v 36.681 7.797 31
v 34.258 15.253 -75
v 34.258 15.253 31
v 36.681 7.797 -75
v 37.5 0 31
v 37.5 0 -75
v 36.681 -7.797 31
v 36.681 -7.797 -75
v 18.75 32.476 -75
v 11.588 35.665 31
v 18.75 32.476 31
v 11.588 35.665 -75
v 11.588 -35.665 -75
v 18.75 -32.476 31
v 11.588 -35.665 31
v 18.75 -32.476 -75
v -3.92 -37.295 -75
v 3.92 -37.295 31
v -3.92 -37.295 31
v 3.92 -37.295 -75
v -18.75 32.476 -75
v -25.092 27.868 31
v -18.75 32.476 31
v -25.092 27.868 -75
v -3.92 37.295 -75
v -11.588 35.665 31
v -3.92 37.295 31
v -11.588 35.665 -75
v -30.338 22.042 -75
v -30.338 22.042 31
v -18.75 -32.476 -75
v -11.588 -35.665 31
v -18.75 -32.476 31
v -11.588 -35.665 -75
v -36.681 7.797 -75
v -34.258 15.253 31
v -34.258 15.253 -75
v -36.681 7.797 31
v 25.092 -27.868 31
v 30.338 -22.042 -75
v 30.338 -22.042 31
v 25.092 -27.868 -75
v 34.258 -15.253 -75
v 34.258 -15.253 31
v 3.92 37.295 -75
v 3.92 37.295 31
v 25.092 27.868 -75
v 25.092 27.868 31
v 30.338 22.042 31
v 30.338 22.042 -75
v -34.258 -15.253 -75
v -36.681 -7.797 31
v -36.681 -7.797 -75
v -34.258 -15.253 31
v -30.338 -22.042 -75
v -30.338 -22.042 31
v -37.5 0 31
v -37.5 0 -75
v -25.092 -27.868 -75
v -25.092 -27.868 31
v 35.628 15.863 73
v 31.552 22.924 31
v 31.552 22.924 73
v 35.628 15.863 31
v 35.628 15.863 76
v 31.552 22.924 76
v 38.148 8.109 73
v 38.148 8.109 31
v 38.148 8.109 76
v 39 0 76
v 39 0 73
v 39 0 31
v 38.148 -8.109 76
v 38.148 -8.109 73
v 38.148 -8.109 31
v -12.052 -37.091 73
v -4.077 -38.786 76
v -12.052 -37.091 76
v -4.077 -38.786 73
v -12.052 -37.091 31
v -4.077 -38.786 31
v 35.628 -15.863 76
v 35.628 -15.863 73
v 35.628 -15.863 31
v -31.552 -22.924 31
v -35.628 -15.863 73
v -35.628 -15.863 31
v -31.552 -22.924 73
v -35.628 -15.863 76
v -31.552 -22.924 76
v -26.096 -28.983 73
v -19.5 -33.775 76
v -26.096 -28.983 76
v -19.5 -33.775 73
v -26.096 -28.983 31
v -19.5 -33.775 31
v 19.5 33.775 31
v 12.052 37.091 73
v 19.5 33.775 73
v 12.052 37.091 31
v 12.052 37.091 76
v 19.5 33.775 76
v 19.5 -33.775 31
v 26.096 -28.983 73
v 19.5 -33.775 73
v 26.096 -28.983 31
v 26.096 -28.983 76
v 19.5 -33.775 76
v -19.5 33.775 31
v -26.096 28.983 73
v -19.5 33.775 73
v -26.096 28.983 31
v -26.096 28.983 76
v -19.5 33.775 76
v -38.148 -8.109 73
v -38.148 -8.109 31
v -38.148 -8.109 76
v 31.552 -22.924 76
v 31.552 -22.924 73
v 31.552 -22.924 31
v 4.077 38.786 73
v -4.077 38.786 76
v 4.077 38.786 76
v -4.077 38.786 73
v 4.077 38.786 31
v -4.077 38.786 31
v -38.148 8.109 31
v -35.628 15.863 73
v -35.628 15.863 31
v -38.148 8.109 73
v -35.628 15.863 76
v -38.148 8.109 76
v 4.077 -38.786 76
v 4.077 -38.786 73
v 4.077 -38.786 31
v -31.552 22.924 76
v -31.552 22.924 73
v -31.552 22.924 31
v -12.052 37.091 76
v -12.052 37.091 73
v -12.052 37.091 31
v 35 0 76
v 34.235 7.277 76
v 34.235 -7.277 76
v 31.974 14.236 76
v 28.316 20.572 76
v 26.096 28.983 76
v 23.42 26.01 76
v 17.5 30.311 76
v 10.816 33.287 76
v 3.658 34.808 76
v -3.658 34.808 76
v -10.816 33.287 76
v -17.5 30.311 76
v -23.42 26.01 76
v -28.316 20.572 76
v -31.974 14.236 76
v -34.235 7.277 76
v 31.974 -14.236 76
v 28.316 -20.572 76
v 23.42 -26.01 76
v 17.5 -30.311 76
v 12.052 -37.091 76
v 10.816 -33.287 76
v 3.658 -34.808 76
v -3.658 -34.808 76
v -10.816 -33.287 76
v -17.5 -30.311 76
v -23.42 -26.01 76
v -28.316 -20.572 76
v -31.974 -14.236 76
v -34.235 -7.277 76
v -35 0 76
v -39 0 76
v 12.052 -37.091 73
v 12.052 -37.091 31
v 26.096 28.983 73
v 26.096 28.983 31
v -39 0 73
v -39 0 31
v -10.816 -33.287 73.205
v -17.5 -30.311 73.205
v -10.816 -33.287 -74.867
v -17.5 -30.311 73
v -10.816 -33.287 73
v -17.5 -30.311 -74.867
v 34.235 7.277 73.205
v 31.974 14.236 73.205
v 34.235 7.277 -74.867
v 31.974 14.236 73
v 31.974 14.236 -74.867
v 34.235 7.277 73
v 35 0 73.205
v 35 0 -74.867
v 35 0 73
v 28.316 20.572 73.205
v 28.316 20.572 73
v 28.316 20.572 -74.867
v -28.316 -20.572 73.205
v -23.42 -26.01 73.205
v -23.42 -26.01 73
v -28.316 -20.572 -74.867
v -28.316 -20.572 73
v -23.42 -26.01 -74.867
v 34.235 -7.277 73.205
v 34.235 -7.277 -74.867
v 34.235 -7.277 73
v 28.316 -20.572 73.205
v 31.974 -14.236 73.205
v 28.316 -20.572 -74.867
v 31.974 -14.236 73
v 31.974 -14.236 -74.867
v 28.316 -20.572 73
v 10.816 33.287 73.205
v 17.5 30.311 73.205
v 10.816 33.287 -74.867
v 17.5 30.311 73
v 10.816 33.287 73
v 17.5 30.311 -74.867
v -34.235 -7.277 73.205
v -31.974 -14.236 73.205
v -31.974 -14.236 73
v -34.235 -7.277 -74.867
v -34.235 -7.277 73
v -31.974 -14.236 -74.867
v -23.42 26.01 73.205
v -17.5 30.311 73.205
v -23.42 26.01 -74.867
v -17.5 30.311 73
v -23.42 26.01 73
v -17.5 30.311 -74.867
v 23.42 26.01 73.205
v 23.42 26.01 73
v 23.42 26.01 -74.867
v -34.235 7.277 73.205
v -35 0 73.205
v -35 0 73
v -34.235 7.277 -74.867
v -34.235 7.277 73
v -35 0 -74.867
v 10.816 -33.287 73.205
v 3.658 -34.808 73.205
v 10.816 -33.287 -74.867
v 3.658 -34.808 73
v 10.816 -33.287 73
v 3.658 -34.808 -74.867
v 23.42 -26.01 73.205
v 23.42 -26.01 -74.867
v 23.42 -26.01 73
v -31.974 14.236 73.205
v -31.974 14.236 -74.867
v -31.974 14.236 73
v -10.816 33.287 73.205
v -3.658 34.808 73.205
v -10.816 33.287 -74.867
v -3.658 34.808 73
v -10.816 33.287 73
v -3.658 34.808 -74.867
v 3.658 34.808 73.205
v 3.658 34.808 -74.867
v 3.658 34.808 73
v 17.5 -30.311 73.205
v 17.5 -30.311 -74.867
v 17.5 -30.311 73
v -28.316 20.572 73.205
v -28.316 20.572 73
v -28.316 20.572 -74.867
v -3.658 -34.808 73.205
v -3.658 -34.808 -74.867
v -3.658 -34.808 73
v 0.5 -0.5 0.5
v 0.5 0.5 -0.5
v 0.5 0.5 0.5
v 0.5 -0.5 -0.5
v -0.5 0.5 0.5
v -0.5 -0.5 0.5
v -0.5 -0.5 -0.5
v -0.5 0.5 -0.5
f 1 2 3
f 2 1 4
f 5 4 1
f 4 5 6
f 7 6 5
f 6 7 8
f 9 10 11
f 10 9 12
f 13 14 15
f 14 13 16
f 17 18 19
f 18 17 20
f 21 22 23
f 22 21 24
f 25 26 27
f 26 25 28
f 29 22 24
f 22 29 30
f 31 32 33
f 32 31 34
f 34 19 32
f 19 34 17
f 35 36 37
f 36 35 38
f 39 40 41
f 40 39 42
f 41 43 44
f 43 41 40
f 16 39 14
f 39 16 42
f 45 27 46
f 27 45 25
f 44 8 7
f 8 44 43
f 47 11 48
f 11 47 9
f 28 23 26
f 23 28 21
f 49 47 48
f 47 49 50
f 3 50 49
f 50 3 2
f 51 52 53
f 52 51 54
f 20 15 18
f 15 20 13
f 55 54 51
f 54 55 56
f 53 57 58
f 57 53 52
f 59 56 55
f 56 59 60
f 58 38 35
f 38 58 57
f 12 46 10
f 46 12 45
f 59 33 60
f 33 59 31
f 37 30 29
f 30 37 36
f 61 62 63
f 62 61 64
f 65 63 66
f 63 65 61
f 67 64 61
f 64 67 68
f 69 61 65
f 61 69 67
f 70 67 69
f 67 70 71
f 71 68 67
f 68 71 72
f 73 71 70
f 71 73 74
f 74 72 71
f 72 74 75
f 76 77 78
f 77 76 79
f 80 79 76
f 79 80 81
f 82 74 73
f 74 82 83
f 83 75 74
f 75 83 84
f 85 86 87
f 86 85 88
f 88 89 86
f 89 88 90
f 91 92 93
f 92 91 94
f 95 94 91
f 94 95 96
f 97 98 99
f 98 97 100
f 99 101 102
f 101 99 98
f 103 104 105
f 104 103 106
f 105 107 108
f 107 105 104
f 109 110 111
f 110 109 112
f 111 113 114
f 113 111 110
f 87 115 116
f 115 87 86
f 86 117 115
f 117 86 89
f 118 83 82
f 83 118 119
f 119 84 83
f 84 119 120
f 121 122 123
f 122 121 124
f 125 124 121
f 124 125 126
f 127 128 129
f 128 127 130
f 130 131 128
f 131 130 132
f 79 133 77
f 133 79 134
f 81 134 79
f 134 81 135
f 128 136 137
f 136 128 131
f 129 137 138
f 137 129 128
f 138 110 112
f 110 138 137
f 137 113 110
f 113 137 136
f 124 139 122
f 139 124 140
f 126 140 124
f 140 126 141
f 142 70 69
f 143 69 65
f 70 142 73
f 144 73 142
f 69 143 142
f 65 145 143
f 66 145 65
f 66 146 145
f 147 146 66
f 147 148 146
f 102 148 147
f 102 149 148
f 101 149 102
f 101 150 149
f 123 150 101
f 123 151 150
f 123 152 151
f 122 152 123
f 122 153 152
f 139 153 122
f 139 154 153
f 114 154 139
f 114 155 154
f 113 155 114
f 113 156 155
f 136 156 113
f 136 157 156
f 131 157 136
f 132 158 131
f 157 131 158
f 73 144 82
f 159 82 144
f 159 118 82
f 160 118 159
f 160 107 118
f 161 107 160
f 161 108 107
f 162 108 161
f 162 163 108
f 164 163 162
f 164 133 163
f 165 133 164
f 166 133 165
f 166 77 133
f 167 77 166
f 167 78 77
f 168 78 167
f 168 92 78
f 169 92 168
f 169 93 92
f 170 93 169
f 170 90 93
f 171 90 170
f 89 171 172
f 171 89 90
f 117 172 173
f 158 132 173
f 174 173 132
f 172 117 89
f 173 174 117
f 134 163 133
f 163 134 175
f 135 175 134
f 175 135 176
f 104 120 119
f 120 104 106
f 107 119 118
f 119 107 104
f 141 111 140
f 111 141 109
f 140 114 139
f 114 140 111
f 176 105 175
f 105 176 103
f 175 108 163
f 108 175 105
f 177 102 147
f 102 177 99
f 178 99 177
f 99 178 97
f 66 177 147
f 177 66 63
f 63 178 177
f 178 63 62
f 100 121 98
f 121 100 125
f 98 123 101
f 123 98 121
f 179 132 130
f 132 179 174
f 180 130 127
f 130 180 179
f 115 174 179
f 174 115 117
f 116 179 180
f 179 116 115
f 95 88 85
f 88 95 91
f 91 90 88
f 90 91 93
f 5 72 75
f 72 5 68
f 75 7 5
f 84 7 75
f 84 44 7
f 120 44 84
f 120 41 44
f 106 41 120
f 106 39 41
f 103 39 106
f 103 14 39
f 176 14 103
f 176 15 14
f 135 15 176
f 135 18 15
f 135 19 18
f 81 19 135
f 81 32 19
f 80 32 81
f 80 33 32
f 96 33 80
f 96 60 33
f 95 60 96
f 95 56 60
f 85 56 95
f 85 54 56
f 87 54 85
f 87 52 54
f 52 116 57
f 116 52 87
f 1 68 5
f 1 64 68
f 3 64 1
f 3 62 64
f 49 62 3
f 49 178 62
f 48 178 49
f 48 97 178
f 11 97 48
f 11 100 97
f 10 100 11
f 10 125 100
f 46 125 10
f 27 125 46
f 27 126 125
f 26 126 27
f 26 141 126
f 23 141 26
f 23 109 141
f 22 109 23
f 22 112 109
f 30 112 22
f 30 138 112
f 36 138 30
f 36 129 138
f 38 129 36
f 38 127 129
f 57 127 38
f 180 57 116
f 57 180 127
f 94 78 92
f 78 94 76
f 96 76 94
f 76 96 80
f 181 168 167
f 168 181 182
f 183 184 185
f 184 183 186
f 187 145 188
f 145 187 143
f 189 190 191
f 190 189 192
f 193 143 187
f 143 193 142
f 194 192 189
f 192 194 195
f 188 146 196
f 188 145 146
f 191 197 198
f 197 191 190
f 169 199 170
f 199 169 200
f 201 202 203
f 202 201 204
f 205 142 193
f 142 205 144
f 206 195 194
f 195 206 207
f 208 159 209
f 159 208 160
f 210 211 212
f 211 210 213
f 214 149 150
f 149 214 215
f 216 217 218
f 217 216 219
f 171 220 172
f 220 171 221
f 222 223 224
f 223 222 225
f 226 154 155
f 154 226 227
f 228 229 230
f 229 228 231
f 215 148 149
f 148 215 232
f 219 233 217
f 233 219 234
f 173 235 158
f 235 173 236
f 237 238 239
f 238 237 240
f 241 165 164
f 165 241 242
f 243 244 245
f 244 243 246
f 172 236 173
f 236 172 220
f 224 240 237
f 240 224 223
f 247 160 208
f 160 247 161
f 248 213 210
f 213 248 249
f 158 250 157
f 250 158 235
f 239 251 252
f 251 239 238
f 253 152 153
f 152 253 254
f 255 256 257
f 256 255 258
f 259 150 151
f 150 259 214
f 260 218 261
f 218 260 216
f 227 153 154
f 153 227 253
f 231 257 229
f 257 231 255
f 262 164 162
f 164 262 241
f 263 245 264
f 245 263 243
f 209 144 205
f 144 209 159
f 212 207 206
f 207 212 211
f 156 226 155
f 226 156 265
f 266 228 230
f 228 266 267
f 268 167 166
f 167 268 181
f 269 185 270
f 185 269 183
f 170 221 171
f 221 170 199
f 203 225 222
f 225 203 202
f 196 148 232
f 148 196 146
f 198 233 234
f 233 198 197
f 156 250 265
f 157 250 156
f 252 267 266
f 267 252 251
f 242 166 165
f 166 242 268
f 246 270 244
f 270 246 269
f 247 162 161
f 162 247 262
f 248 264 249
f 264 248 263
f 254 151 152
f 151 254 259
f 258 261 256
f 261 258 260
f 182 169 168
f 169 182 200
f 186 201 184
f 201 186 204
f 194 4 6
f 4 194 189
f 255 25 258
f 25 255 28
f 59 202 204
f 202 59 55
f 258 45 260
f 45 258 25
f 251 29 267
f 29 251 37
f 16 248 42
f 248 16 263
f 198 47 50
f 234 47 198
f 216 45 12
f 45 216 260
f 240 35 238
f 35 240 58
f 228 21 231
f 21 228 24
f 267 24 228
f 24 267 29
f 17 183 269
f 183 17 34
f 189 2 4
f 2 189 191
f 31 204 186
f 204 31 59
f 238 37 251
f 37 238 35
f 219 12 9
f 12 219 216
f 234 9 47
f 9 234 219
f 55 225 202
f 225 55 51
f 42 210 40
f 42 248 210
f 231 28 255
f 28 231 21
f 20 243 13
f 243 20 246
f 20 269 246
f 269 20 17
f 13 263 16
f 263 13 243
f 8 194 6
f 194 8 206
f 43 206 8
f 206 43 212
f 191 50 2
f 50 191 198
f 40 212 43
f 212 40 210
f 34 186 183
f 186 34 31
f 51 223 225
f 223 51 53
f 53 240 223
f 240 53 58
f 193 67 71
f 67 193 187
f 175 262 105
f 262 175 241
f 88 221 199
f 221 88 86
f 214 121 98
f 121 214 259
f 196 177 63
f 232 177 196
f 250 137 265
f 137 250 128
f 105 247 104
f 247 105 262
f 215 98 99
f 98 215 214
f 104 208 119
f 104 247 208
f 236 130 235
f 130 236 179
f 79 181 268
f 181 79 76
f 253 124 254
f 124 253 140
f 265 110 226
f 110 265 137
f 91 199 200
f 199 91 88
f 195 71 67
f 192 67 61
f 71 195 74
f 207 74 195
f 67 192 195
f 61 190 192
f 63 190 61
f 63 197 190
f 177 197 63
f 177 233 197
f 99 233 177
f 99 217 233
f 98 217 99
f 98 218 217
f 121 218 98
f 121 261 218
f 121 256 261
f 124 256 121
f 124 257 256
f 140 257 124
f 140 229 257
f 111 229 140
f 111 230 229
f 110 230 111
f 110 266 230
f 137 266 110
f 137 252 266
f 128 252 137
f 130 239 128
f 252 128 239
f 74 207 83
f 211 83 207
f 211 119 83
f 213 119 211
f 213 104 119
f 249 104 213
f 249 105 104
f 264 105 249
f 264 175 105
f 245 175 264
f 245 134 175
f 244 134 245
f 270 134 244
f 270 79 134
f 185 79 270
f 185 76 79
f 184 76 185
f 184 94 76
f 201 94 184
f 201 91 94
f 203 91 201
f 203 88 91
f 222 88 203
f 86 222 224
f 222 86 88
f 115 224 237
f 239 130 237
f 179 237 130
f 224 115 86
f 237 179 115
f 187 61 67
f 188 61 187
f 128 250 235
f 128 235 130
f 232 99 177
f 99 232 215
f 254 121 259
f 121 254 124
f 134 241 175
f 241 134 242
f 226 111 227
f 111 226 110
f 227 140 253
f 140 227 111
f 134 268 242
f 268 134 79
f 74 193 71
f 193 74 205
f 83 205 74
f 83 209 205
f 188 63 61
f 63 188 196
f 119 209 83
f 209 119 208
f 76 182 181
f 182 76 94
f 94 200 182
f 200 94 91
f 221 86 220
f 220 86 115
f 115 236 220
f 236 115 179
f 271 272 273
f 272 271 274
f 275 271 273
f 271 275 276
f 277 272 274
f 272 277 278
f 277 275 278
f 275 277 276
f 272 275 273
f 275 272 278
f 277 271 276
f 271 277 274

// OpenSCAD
// Parameters
pipe_length = 150; //[75:300:1]
outer_diameter = 75; //[40:150:1]
wall_thickness = 2.5; //[1.2:5:0.1]
socket_length = 45; //[25:90:1]
socket_wall_extra = 1.5; //[0.5:4:0.1]
chamfer_length = 2; //[0.5:6:0.1]
overlap = 1; //[0.5:2:0.1]

// Base Shapes
module pipe_body() {
  cylinder(h = pipe_length, r = outer_diameter / 2, center = true);
}

module inner_bore() {
  cylinder(h = pipe_length + 2 * overlap, r = outer_diameter / 2 - wall_thickness, center = true);
}

module socket_end() {
  translate([0, 0, pipe_length / 2 - socket_length / 2 + overlap])
    cylinder(h = socket_length, r = outer_diameter / 2 + socket_wall_extra, center = true);
}

module chamfer_outer_spigot() {
  translate([0, 0, -pipe_length / 2 + chamfer_length / 2])
    cylinder(h = chamfer_length, r1 = outer_diameter / 2, r2 = 0, center = true);
}

module chamfer_inner_spigot() {
  translate([0, 0, -pipe_length / 2 + chamfer_length / 2])
    cylinder(h = chamfer_length, r1 = outer_diameter / 2 - wall_thickness, r2 = 0, center = true);
}

module chamfer_outer_socket() {
  translate([0, 0, pipe_length / 2 - chamfer_length / 2])
    cylinder(h = chamfer_length, r1 = outer_diameter / 2 + socket_wall_extra, r2 = 0, center = true);
}

module chamfer_inner_socket() {
  translate([0, 0, pipe_length / 2 - chamfer_length / 2])
    cylinder(h = chamfer_length, r1 = outer_diameter / 2 - wall_thickness, r2 = 0, center = true);
}

module markings_text() {
  translate([0, 0, 0])
    cube([overlap, overlap, overlap], center = true);
}

// Operations
module outer_union() {
  union() {
    pipe_body();
    socket_end();
  }
}

module chamfers_union() {
  union() {
    chamfer_outer_spigot();
    chamfer_inner_spigot();
    chamfer_outer_socket();
    chamfer_inner_socket();
  }
}

module pipe_with_bore() {
  difference() {
    outer_union();
    inner_bore();
  }
}

module pipe_with_chamfers() {
  difference() {
    pipe_with_bore();
    chamfers_union();
  }
}

module final_model() {
  union() {
    pipe_with_chamfers();
    markings_text();
  }
}

// Final Output
final_model();
